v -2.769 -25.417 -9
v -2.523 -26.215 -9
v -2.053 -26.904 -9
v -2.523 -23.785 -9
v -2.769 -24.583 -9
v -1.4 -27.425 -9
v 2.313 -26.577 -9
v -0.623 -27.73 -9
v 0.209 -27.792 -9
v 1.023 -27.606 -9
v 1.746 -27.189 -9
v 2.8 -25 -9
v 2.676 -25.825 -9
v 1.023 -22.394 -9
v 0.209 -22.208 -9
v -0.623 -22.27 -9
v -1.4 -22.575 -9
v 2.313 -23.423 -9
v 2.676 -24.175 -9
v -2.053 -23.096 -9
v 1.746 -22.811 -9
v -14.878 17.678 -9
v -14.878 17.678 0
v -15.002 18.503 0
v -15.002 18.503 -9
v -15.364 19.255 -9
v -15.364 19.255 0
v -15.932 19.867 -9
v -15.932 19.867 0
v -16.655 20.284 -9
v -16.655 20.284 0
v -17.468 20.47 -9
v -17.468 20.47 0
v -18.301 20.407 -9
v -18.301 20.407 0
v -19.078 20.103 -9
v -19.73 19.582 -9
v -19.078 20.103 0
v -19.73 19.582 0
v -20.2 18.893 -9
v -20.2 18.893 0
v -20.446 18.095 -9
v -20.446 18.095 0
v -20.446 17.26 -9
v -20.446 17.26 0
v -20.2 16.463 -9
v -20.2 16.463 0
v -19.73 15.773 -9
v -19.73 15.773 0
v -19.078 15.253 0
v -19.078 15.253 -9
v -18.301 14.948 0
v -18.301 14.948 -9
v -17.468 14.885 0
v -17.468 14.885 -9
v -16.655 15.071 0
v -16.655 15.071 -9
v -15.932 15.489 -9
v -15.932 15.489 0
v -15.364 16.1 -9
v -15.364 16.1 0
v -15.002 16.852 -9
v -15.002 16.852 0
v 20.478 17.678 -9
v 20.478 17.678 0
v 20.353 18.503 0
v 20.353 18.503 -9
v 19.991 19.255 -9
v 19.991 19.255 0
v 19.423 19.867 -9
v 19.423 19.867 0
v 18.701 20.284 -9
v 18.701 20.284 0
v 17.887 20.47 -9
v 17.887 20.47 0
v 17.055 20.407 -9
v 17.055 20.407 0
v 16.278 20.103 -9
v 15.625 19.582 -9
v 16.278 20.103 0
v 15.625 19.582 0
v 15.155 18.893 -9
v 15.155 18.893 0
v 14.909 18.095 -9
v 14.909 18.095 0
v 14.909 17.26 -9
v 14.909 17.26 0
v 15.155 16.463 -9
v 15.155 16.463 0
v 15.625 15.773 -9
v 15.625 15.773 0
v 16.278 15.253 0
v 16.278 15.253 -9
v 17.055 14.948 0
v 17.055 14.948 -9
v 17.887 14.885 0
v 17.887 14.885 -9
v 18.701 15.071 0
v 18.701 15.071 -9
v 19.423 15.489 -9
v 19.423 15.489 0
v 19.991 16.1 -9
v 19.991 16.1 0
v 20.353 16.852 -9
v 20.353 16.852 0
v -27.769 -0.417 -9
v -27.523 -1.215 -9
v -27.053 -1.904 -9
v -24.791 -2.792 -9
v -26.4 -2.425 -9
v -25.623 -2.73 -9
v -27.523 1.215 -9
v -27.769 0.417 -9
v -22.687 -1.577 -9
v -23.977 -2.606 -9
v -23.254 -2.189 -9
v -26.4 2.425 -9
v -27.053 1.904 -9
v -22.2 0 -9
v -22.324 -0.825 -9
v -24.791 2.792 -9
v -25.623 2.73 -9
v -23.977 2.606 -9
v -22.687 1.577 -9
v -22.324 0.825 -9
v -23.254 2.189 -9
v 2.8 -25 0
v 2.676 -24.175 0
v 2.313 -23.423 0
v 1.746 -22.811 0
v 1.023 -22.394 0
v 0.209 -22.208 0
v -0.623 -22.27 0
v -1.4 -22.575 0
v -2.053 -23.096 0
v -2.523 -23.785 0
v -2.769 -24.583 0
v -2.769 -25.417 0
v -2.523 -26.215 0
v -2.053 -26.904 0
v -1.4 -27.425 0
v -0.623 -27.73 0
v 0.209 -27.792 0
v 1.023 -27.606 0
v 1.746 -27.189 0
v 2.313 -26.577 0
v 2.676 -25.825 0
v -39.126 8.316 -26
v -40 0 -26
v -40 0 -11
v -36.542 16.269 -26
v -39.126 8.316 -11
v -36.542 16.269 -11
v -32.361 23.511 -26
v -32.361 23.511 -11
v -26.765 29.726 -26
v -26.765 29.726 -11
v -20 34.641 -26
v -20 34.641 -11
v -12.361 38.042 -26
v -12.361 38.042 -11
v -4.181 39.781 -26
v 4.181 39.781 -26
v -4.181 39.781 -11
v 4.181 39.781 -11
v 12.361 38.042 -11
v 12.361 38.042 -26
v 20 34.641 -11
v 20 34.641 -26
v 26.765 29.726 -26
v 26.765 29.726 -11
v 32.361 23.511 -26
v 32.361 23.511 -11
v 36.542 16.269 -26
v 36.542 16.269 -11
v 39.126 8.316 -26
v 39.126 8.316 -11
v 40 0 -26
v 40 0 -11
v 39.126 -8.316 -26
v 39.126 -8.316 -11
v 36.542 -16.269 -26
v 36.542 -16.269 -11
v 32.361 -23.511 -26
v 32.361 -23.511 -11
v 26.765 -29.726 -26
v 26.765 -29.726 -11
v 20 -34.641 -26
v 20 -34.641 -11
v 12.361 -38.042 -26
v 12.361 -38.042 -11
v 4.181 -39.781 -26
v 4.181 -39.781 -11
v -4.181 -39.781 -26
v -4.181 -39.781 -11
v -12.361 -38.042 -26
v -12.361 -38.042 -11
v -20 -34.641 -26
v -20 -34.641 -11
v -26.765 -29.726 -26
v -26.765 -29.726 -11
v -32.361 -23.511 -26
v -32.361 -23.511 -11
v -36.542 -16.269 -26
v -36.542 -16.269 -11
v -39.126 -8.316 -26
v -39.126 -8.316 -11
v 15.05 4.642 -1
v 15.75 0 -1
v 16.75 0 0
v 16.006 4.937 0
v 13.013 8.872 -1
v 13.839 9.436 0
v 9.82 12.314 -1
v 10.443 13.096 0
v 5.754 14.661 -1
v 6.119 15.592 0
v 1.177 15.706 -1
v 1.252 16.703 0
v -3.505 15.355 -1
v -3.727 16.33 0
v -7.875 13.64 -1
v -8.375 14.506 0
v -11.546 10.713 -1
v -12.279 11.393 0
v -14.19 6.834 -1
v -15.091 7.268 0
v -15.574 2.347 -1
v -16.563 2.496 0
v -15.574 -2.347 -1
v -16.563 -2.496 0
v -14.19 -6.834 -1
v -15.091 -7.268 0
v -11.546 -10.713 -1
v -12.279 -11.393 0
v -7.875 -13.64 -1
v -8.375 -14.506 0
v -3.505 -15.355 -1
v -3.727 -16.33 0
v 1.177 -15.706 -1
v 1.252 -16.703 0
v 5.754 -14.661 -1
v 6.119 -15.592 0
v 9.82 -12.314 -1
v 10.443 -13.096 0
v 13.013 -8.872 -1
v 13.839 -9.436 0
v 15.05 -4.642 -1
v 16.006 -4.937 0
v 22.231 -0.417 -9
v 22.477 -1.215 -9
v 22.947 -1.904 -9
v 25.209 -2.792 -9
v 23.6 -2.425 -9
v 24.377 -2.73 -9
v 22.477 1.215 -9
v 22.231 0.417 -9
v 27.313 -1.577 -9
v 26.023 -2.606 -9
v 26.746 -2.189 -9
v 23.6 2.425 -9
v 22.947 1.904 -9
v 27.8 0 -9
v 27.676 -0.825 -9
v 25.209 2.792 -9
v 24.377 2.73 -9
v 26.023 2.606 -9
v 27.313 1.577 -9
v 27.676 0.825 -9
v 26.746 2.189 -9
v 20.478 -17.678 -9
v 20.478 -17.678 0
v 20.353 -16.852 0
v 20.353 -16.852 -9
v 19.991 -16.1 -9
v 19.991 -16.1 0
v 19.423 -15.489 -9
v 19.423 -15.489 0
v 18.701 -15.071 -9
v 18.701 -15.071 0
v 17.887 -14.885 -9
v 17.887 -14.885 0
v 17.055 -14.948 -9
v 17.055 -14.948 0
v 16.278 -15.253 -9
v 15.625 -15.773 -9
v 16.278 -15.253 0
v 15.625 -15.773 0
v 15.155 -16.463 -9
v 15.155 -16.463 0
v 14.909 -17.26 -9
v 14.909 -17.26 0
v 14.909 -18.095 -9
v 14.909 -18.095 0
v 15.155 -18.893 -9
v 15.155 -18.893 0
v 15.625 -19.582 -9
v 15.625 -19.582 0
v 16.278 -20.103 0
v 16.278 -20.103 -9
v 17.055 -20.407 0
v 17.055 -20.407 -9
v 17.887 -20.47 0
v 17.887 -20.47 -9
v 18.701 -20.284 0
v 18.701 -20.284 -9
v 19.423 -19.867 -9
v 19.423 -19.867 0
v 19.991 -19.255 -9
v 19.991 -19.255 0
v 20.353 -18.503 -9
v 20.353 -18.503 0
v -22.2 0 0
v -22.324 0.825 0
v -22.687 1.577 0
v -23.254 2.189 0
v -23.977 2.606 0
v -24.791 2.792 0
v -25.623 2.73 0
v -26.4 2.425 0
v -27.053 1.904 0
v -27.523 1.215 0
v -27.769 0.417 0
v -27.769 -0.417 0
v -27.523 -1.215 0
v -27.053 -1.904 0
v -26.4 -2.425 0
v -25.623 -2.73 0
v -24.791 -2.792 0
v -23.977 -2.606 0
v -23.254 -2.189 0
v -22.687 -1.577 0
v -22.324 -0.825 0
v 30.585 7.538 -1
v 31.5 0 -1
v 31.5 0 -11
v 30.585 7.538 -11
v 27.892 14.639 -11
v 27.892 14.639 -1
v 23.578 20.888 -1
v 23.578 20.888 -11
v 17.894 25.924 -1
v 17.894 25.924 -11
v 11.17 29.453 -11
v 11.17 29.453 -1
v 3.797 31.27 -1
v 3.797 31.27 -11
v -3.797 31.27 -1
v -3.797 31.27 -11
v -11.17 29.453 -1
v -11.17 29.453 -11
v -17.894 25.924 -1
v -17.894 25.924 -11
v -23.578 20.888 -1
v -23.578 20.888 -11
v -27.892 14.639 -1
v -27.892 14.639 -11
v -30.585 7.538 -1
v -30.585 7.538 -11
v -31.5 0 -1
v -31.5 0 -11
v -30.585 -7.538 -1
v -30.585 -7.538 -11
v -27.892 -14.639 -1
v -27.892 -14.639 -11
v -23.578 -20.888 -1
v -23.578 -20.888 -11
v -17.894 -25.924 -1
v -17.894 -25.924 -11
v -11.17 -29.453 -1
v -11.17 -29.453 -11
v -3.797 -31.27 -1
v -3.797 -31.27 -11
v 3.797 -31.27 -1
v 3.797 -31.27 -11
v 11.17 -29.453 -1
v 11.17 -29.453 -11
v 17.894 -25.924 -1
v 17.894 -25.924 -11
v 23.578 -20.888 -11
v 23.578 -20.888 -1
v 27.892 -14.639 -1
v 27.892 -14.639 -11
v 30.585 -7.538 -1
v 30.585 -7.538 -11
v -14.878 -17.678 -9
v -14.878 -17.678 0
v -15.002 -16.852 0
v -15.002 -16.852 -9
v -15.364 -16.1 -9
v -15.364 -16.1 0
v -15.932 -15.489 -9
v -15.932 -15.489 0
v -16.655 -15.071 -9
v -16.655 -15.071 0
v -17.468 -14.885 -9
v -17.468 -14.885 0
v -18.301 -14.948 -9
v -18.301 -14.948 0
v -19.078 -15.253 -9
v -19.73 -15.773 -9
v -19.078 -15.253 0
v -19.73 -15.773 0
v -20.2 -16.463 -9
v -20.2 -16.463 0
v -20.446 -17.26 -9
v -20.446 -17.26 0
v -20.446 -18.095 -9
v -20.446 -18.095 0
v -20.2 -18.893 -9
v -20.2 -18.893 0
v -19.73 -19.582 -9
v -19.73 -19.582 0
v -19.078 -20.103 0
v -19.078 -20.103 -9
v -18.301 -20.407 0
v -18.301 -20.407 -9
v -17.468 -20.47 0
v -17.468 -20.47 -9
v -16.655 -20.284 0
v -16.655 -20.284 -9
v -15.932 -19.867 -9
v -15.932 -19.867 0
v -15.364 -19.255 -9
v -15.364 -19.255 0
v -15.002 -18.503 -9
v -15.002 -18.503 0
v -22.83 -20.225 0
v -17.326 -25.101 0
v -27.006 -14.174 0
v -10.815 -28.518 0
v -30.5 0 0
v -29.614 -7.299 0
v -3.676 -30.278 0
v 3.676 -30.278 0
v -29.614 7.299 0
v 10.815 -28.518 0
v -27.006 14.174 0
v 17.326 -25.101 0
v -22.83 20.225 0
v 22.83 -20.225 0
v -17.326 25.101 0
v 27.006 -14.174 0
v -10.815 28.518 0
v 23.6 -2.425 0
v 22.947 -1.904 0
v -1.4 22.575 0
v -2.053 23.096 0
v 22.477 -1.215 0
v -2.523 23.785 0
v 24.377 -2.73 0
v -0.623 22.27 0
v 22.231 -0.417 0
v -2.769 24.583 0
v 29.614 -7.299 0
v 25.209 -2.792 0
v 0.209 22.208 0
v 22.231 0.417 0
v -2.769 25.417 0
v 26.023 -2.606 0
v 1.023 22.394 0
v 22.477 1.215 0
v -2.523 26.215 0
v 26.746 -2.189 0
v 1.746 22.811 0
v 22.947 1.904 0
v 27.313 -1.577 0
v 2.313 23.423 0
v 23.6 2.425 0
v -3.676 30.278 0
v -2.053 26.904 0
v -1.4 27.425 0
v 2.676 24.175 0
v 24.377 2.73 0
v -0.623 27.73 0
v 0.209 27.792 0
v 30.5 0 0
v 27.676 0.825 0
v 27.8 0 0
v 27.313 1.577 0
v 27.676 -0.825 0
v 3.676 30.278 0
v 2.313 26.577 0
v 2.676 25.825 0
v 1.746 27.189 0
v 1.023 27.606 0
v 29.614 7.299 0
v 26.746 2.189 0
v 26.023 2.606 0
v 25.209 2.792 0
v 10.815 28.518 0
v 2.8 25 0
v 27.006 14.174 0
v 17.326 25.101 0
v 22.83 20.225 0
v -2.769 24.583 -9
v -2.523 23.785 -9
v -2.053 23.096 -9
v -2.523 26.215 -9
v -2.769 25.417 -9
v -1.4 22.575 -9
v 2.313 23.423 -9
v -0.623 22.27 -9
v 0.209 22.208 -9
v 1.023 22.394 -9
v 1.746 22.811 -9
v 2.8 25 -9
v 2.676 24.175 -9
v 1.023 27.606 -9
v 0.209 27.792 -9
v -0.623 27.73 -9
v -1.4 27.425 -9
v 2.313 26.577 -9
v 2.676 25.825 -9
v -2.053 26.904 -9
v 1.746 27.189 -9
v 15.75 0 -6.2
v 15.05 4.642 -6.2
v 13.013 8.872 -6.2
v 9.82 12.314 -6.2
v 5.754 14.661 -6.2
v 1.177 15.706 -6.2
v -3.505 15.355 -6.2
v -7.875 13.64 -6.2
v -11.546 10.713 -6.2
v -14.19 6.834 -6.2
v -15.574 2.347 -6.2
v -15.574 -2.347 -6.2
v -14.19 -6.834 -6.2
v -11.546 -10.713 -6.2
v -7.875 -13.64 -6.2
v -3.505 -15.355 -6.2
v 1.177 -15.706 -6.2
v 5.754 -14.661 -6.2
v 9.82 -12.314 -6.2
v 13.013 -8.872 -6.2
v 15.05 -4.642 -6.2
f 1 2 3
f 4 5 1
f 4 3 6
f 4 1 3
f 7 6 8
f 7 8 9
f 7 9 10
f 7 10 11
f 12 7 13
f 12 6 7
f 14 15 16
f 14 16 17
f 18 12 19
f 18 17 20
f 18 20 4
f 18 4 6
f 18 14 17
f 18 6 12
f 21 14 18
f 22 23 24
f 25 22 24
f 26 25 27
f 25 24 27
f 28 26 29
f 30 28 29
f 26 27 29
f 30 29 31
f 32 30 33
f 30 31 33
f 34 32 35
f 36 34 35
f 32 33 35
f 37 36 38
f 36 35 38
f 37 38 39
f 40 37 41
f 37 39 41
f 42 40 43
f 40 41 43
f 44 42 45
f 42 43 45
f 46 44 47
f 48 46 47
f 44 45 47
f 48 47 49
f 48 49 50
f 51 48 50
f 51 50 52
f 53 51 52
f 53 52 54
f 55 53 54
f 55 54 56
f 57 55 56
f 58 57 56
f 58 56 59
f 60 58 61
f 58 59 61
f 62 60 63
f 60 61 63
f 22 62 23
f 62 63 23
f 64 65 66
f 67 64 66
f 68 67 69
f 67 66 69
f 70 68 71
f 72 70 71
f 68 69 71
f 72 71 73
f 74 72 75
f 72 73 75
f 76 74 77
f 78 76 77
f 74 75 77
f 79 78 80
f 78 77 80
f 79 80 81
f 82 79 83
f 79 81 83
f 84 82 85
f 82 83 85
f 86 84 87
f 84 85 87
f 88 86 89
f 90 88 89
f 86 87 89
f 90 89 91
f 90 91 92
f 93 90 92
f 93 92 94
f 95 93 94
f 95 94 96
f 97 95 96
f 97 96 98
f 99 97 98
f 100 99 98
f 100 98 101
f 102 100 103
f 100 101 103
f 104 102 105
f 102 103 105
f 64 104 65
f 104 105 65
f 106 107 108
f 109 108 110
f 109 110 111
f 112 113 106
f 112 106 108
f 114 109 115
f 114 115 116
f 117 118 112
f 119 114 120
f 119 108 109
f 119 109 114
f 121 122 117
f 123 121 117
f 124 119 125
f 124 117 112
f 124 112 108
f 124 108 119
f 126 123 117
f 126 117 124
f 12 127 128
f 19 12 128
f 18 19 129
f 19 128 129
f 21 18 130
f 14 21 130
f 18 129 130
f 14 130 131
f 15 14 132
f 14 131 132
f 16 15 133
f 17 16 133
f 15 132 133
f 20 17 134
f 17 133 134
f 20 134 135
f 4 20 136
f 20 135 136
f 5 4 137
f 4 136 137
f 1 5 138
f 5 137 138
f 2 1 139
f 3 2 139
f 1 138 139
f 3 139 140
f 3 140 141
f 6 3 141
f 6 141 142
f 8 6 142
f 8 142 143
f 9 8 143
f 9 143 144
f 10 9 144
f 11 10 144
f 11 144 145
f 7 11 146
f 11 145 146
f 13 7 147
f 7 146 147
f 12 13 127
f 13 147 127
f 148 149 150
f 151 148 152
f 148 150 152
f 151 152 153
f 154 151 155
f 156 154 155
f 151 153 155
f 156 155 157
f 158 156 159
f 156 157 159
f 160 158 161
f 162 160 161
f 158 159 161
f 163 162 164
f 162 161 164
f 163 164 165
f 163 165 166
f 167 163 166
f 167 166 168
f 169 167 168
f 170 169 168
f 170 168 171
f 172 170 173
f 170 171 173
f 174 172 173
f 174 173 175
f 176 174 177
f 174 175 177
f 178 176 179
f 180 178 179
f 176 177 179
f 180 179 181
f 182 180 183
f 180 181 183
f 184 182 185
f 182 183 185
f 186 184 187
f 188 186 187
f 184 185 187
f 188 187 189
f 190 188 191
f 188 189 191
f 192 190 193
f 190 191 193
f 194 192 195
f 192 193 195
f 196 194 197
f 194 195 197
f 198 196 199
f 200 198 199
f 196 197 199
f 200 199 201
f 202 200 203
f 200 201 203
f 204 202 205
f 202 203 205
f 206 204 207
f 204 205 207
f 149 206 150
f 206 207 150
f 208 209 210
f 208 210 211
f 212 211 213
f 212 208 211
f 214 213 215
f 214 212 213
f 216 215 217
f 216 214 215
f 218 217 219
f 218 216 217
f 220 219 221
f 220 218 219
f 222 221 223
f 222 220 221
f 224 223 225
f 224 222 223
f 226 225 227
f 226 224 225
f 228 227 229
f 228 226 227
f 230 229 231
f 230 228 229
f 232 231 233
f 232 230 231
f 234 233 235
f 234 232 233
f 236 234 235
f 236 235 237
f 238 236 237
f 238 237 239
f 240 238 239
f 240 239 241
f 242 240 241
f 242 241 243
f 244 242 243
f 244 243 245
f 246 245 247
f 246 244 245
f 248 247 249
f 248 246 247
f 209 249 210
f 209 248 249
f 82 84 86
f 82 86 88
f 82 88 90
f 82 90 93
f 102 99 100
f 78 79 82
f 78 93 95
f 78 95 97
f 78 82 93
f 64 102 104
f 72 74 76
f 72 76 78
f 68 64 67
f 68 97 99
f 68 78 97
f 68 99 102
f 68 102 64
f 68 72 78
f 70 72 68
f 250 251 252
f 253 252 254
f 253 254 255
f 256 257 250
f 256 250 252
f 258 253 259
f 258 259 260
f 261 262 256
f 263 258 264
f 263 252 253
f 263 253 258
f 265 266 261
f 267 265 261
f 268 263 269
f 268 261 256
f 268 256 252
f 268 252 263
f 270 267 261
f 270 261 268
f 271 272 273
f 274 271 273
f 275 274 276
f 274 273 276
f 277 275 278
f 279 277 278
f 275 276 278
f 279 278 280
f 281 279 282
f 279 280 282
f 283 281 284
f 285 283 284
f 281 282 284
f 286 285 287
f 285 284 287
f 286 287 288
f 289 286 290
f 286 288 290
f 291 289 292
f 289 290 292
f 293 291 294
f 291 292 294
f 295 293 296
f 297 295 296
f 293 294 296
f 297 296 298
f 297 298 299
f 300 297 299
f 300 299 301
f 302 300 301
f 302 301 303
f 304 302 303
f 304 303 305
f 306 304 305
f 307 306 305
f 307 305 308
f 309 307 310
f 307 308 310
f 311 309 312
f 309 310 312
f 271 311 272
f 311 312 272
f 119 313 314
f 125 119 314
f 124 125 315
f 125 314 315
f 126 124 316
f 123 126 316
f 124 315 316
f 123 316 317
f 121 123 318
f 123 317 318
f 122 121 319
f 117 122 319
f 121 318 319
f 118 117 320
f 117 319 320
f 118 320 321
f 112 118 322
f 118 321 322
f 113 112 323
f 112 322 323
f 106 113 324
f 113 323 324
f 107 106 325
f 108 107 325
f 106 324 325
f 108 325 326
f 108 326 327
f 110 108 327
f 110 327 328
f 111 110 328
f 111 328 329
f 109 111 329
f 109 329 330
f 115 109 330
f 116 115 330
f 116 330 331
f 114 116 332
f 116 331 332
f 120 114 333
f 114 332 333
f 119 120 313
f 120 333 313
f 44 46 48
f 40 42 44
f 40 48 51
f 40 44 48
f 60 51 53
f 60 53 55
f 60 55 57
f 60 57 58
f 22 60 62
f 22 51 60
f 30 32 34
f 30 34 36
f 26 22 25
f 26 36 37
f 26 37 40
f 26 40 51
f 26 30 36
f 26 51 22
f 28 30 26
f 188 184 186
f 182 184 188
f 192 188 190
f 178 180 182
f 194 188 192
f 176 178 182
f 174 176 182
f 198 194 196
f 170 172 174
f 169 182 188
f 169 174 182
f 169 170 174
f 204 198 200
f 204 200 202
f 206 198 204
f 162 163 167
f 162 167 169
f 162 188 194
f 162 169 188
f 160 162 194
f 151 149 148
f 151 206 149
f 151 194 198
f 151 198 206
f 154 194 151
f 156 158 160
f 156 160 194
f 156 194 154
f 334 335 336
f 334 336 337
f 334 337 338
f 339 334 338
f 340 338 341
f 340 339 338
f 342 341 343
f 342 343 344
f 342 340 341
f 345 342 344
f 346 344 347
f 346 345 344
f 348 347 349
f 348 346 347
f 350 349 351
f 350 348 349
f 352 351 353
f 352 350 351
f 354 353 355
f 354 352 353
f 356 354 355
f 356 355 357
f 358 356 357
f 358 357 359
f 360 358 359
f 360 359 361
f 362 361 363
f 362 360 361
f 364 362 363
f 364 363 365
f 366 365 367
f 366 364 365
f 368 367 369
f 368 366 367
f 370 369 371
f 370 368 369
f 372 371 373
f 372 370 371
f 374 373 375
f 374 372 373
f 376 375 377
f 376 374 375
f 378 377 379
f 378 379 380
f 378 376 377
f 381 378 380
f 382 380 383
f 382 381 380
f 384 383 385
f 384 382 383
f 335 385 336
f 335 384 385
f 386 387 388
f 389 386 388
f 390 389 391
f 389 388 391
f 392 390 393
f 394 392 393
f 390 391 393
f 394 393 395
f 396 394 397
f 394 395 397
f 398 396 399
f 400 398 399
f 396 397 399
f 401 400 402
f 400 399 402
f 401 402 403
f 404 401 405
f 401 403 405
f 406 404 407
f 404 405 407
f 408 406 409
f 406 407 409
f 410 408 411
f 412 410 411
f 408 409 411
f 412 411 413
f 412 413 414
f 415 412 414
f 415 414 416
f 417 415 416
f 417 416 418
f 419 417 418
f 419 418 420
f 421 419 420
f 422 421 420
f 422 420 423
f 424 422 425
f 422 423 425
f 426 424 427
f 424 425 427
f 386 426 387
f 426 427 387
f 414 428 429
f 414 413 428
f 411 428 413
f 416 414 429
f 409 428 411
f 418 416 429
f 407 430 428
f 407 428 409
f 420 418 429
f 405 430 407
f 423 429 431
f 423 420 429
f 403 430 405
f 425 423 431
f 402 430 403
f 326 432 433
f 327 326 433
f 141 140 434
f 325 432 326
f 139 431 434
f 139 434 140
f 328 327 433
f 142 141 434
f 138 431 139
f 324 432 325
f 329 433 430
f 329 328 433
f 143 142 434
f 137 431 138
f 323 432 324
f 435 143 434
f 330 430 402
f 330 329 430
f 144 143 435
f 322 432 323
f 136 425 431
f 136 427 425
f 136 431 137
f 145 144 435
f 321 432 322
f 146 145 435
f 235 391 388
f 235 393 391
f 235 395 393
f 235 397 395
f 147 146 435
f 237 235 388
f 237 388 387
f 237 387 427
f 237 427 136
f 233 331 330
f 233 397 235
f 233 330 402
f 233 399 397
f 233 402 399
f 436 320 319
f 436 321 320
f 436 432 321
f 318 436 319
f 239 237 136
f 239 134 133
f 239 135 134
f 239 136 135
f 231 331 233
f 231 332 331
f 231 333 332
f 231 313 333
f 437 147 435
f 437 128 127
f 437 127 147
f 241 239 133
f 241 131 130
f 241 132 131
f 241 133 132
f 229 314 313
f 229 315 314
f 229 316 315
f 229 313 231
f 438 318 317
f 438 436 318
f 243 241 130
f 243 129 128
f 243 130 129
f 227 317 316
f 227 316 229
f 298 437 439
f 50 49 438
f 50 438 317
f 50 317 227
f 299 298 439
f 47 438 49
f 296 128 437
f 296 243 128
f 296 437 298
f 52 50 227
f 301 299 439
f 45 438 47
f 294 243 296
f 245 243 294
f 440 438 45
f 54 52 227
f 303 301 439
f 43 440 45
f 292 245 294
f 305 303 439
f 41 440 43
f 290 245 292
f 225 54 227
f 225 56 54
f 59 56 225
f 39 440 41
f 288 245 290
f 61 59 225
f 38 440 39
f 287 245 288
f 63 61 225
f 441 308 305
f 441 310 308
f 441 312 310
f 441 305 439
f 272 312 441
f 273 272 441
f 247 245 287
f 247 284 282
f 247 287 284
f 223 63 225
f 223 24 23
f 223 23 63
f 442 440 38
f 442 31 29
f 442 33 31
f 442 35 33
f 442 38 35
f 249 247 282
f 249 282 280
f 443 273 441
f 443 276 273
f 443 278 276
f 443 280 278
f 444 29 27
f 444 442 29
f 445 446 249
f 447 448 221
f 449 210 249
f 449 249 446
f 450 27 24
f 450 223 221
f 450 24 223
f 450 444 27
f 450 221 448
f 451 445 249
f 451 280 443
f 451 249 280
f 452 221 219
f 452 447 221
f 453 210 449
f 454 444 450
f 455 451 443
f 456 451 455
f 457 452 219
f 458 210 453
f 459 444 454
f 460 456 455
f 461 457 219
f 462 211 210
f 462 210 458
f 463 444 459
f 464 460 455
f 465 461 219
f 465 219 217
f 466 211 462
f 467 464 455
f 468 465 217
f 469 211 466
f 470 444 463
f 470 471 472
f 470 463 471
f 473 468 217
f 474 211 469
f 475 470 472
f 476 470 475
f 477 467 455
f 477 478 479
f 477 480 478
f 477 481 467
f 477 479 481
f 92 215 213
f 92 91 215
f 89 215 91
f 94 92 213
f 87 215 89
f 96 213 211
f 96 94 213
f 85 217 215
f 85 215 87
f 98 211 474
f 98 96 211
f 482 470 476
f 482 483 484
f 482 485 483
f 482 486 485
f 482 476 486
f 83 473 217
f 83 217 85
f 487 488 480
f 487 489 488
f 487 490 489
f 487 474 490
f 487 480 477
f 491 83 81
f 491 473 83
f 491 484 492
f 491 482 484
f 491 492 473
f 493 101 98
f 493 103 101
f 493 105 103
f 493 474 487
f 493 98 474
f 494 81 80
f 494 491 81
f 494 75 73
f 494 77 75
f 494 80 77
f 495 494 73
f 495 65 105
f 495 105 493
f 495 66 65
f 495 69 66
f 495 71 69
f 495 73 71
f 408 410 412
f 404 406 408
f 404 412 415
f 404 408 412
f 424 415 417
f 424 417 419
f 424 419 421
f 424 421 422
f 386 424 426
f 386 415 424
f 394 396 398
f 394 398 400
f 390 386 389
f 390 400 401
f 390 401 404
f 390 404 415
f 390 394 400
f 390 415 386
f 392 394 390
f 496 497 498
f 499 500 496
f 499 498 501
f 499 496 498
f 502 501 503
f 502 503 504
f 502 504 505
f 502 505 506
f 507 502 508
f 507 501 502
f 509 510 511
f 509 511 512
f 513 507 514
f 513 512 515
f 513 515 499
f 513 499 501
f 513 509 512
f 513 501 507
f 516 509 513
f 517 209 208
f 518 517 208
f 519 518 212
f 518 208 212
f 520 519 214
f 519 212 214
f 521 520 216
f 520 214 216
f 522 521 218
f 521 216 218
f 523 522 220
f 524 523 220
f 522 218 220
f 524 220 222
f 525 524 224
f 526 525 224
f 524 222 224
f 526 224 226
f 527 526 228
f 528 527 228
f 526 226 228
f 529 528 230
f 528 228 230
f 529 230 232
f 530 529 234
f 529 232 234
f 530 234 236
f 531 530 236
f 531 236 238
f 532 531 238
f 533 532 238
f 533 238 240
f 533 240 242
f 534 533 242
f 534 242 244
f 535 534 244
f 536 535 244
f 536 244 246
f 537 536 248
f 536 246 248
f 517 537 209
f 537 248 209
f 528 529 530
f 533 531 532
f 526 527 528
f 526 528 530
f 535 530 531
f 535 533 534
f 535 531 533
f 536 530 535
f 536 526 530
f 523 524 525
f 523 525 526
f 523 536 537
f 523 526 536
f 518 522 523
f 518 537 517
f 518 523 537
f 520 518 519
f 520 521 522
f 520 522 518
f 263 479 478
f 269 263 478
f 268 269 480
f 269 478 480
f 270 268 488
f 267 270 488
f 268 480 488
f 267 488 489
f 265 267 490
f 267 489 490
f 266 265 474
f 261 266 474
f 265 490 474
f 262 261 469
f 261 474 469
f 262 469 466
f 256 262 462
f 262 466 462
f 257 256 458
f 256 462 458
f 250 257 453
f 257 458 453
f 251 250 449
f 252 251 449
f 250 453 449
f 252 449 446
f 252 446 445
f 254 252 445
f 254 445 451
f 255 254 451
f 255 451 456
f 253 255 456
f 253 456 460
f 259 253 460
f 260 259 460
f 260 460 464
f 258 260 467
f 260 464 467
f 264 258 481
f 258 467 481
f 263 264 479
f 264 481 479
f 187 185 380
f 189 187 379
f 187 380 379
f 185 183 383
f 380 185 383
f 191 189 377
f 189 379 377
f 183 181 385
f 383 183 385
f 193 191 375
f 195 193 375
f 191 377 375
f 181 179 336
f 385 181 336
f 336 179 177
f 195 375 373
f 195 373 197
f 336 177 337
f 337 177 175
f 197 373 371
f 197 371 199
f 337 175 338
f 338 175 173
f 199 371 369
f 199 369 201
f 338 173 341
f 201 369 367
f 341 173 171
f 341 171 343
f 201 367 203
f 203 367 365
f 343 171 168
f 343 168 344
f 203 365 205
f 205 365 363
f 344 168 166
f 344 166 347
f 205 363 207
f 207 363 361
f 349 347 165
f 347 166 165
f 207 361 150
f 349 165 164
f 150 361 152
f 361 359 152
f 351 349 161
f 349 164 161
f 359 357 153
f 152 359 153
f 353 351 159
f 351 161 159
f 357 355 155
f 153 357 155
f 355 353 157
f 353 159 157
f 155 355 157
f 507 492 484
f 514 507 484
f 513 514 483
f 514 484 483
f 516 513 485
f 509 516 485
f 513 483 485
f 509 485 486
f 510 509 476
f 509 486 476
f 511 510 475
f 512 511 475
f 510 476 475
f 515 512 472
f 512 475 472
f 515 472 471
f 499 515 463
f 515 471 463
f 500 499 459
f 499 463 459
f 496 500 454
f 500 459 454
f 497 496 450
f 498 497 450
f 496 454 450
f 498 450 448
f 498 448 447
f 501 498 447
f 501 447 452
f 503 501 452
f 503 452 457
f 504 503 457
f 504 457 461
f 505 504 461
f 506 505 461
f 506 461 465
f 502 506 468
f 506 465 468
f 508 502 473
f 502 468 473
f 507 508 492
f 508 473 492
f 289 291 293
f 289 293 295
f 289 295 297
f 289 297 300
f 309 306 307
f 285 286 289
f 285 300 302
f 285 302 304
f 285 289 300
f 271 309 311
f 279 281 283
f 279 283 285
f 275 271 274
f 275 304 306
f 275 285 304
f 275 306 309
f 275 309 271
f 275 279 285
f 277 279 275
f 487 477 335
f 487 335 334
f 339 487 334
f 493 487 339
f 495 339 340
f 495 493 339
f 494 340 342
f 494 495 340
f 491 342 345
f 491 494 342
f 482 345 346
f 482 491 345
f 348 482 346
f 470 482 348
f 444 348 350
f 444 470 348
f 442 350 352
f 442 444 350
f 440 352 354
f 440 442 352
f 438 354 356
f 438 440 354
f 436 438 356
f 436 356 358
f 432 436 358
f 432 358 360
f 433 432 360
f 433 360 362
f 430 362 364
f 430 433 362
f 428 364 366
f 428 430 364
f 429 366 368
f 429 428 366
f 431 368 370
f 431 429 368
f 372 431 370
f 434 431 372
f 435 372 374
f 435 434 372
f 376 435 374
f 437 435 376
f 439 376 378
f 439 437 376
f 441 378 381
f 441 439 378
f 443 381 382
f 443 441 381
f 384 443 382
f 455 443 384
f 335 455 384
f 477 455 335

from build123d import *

# Parameters (mm, degrees)
SKETCH1_R           = 31.5
BOSS_EXTRUDE1_DEPTH = 11
SKETCH2_R           = 2.8
CUT_EXTRUDE5_DEPTH  = 9
SKETCH4_R           = 15.75
CUT_EXTRUDE6_DEPTH  = 6.2
CHAMFER1_SIZE       = 1
CHAMFER2_SIZE       = 1
SKETCH5_R           = 40
BOSS_EXTRUDE3_DEPTH = 15


with BuildPart() as part:
    # Sketch1 → Boss-Extrude1 (new body)
    with BuildSketch(Plane.XY):
        Circle(SKETCH1_R)
    extrude(amount=-BOSS_EXTRUDE1_DEPTH)

    # Sketch2 → Cut-Extrude5 (cut)
    with BuildSketch(Plane.XY):
        with Locations((0, 25)):
            Circle(SKETCH2_R)
        with Locations((17.67766953, 17.67766953)):
            Circle(SKETCH2_R)
        with Locations((25, 0)):
            Circle(SKETCH2_R)
        with Locations((17.67766953, -17.67766953)):
            Circle(SKETCH2_R)
        with Locations((0, -25)):
            Circle(SKETCH2_R)
        with Locations((-17.67766953, -17.67766953)):
            Circle(SKETCH2_R)
        with Locations((-25, 0)):
            Circle(SKETCH2_R)
        with Locations((-17.67766953, 17.67766953)):
            Circle(SKETCH2_R)
    extrude(amount=-CUT_EXTRUDE5_DEPTH, mode=Mode.SUBTRACT)

    # Sketch4 → Cut-Extrude6 (cut)
    with BuildSketch(Plane.XY):
        Circle(SKETCH4_R)
    extrude(amount=-CUT_EXTRUDE6_DEPTH, mode=Mode.SUBTRACT)

    # Chamfer1
    chamfer1_edges = [part.edges().sort_by_distance(p)[0] for p in [
        (-31.5, 0, 0),
    ]]
    chamfer(chamfer1_edges, length=CHAMFER1_SIZE)

    # Chamfer2
    chamfer2_edges = [part.edges().sort_by_distance(p)[0] for p in [
        (-15.75, 0, 0),
    ]]
    chamfer(chamfer2_edges, length=CHAMFER2_SIZE)

    # Sketch5 → Boss-Extrude3 (add)
    with BuildSketch(Plane(origin=(0, 0, -11), x_dir=(-1, 0, 0), z_dir=(0, 0, -1))):
        Circle(SKETCH5_R)
    extrude(amount=BOSS_EXTRUDE3_DEPTH)


solid = part.part
